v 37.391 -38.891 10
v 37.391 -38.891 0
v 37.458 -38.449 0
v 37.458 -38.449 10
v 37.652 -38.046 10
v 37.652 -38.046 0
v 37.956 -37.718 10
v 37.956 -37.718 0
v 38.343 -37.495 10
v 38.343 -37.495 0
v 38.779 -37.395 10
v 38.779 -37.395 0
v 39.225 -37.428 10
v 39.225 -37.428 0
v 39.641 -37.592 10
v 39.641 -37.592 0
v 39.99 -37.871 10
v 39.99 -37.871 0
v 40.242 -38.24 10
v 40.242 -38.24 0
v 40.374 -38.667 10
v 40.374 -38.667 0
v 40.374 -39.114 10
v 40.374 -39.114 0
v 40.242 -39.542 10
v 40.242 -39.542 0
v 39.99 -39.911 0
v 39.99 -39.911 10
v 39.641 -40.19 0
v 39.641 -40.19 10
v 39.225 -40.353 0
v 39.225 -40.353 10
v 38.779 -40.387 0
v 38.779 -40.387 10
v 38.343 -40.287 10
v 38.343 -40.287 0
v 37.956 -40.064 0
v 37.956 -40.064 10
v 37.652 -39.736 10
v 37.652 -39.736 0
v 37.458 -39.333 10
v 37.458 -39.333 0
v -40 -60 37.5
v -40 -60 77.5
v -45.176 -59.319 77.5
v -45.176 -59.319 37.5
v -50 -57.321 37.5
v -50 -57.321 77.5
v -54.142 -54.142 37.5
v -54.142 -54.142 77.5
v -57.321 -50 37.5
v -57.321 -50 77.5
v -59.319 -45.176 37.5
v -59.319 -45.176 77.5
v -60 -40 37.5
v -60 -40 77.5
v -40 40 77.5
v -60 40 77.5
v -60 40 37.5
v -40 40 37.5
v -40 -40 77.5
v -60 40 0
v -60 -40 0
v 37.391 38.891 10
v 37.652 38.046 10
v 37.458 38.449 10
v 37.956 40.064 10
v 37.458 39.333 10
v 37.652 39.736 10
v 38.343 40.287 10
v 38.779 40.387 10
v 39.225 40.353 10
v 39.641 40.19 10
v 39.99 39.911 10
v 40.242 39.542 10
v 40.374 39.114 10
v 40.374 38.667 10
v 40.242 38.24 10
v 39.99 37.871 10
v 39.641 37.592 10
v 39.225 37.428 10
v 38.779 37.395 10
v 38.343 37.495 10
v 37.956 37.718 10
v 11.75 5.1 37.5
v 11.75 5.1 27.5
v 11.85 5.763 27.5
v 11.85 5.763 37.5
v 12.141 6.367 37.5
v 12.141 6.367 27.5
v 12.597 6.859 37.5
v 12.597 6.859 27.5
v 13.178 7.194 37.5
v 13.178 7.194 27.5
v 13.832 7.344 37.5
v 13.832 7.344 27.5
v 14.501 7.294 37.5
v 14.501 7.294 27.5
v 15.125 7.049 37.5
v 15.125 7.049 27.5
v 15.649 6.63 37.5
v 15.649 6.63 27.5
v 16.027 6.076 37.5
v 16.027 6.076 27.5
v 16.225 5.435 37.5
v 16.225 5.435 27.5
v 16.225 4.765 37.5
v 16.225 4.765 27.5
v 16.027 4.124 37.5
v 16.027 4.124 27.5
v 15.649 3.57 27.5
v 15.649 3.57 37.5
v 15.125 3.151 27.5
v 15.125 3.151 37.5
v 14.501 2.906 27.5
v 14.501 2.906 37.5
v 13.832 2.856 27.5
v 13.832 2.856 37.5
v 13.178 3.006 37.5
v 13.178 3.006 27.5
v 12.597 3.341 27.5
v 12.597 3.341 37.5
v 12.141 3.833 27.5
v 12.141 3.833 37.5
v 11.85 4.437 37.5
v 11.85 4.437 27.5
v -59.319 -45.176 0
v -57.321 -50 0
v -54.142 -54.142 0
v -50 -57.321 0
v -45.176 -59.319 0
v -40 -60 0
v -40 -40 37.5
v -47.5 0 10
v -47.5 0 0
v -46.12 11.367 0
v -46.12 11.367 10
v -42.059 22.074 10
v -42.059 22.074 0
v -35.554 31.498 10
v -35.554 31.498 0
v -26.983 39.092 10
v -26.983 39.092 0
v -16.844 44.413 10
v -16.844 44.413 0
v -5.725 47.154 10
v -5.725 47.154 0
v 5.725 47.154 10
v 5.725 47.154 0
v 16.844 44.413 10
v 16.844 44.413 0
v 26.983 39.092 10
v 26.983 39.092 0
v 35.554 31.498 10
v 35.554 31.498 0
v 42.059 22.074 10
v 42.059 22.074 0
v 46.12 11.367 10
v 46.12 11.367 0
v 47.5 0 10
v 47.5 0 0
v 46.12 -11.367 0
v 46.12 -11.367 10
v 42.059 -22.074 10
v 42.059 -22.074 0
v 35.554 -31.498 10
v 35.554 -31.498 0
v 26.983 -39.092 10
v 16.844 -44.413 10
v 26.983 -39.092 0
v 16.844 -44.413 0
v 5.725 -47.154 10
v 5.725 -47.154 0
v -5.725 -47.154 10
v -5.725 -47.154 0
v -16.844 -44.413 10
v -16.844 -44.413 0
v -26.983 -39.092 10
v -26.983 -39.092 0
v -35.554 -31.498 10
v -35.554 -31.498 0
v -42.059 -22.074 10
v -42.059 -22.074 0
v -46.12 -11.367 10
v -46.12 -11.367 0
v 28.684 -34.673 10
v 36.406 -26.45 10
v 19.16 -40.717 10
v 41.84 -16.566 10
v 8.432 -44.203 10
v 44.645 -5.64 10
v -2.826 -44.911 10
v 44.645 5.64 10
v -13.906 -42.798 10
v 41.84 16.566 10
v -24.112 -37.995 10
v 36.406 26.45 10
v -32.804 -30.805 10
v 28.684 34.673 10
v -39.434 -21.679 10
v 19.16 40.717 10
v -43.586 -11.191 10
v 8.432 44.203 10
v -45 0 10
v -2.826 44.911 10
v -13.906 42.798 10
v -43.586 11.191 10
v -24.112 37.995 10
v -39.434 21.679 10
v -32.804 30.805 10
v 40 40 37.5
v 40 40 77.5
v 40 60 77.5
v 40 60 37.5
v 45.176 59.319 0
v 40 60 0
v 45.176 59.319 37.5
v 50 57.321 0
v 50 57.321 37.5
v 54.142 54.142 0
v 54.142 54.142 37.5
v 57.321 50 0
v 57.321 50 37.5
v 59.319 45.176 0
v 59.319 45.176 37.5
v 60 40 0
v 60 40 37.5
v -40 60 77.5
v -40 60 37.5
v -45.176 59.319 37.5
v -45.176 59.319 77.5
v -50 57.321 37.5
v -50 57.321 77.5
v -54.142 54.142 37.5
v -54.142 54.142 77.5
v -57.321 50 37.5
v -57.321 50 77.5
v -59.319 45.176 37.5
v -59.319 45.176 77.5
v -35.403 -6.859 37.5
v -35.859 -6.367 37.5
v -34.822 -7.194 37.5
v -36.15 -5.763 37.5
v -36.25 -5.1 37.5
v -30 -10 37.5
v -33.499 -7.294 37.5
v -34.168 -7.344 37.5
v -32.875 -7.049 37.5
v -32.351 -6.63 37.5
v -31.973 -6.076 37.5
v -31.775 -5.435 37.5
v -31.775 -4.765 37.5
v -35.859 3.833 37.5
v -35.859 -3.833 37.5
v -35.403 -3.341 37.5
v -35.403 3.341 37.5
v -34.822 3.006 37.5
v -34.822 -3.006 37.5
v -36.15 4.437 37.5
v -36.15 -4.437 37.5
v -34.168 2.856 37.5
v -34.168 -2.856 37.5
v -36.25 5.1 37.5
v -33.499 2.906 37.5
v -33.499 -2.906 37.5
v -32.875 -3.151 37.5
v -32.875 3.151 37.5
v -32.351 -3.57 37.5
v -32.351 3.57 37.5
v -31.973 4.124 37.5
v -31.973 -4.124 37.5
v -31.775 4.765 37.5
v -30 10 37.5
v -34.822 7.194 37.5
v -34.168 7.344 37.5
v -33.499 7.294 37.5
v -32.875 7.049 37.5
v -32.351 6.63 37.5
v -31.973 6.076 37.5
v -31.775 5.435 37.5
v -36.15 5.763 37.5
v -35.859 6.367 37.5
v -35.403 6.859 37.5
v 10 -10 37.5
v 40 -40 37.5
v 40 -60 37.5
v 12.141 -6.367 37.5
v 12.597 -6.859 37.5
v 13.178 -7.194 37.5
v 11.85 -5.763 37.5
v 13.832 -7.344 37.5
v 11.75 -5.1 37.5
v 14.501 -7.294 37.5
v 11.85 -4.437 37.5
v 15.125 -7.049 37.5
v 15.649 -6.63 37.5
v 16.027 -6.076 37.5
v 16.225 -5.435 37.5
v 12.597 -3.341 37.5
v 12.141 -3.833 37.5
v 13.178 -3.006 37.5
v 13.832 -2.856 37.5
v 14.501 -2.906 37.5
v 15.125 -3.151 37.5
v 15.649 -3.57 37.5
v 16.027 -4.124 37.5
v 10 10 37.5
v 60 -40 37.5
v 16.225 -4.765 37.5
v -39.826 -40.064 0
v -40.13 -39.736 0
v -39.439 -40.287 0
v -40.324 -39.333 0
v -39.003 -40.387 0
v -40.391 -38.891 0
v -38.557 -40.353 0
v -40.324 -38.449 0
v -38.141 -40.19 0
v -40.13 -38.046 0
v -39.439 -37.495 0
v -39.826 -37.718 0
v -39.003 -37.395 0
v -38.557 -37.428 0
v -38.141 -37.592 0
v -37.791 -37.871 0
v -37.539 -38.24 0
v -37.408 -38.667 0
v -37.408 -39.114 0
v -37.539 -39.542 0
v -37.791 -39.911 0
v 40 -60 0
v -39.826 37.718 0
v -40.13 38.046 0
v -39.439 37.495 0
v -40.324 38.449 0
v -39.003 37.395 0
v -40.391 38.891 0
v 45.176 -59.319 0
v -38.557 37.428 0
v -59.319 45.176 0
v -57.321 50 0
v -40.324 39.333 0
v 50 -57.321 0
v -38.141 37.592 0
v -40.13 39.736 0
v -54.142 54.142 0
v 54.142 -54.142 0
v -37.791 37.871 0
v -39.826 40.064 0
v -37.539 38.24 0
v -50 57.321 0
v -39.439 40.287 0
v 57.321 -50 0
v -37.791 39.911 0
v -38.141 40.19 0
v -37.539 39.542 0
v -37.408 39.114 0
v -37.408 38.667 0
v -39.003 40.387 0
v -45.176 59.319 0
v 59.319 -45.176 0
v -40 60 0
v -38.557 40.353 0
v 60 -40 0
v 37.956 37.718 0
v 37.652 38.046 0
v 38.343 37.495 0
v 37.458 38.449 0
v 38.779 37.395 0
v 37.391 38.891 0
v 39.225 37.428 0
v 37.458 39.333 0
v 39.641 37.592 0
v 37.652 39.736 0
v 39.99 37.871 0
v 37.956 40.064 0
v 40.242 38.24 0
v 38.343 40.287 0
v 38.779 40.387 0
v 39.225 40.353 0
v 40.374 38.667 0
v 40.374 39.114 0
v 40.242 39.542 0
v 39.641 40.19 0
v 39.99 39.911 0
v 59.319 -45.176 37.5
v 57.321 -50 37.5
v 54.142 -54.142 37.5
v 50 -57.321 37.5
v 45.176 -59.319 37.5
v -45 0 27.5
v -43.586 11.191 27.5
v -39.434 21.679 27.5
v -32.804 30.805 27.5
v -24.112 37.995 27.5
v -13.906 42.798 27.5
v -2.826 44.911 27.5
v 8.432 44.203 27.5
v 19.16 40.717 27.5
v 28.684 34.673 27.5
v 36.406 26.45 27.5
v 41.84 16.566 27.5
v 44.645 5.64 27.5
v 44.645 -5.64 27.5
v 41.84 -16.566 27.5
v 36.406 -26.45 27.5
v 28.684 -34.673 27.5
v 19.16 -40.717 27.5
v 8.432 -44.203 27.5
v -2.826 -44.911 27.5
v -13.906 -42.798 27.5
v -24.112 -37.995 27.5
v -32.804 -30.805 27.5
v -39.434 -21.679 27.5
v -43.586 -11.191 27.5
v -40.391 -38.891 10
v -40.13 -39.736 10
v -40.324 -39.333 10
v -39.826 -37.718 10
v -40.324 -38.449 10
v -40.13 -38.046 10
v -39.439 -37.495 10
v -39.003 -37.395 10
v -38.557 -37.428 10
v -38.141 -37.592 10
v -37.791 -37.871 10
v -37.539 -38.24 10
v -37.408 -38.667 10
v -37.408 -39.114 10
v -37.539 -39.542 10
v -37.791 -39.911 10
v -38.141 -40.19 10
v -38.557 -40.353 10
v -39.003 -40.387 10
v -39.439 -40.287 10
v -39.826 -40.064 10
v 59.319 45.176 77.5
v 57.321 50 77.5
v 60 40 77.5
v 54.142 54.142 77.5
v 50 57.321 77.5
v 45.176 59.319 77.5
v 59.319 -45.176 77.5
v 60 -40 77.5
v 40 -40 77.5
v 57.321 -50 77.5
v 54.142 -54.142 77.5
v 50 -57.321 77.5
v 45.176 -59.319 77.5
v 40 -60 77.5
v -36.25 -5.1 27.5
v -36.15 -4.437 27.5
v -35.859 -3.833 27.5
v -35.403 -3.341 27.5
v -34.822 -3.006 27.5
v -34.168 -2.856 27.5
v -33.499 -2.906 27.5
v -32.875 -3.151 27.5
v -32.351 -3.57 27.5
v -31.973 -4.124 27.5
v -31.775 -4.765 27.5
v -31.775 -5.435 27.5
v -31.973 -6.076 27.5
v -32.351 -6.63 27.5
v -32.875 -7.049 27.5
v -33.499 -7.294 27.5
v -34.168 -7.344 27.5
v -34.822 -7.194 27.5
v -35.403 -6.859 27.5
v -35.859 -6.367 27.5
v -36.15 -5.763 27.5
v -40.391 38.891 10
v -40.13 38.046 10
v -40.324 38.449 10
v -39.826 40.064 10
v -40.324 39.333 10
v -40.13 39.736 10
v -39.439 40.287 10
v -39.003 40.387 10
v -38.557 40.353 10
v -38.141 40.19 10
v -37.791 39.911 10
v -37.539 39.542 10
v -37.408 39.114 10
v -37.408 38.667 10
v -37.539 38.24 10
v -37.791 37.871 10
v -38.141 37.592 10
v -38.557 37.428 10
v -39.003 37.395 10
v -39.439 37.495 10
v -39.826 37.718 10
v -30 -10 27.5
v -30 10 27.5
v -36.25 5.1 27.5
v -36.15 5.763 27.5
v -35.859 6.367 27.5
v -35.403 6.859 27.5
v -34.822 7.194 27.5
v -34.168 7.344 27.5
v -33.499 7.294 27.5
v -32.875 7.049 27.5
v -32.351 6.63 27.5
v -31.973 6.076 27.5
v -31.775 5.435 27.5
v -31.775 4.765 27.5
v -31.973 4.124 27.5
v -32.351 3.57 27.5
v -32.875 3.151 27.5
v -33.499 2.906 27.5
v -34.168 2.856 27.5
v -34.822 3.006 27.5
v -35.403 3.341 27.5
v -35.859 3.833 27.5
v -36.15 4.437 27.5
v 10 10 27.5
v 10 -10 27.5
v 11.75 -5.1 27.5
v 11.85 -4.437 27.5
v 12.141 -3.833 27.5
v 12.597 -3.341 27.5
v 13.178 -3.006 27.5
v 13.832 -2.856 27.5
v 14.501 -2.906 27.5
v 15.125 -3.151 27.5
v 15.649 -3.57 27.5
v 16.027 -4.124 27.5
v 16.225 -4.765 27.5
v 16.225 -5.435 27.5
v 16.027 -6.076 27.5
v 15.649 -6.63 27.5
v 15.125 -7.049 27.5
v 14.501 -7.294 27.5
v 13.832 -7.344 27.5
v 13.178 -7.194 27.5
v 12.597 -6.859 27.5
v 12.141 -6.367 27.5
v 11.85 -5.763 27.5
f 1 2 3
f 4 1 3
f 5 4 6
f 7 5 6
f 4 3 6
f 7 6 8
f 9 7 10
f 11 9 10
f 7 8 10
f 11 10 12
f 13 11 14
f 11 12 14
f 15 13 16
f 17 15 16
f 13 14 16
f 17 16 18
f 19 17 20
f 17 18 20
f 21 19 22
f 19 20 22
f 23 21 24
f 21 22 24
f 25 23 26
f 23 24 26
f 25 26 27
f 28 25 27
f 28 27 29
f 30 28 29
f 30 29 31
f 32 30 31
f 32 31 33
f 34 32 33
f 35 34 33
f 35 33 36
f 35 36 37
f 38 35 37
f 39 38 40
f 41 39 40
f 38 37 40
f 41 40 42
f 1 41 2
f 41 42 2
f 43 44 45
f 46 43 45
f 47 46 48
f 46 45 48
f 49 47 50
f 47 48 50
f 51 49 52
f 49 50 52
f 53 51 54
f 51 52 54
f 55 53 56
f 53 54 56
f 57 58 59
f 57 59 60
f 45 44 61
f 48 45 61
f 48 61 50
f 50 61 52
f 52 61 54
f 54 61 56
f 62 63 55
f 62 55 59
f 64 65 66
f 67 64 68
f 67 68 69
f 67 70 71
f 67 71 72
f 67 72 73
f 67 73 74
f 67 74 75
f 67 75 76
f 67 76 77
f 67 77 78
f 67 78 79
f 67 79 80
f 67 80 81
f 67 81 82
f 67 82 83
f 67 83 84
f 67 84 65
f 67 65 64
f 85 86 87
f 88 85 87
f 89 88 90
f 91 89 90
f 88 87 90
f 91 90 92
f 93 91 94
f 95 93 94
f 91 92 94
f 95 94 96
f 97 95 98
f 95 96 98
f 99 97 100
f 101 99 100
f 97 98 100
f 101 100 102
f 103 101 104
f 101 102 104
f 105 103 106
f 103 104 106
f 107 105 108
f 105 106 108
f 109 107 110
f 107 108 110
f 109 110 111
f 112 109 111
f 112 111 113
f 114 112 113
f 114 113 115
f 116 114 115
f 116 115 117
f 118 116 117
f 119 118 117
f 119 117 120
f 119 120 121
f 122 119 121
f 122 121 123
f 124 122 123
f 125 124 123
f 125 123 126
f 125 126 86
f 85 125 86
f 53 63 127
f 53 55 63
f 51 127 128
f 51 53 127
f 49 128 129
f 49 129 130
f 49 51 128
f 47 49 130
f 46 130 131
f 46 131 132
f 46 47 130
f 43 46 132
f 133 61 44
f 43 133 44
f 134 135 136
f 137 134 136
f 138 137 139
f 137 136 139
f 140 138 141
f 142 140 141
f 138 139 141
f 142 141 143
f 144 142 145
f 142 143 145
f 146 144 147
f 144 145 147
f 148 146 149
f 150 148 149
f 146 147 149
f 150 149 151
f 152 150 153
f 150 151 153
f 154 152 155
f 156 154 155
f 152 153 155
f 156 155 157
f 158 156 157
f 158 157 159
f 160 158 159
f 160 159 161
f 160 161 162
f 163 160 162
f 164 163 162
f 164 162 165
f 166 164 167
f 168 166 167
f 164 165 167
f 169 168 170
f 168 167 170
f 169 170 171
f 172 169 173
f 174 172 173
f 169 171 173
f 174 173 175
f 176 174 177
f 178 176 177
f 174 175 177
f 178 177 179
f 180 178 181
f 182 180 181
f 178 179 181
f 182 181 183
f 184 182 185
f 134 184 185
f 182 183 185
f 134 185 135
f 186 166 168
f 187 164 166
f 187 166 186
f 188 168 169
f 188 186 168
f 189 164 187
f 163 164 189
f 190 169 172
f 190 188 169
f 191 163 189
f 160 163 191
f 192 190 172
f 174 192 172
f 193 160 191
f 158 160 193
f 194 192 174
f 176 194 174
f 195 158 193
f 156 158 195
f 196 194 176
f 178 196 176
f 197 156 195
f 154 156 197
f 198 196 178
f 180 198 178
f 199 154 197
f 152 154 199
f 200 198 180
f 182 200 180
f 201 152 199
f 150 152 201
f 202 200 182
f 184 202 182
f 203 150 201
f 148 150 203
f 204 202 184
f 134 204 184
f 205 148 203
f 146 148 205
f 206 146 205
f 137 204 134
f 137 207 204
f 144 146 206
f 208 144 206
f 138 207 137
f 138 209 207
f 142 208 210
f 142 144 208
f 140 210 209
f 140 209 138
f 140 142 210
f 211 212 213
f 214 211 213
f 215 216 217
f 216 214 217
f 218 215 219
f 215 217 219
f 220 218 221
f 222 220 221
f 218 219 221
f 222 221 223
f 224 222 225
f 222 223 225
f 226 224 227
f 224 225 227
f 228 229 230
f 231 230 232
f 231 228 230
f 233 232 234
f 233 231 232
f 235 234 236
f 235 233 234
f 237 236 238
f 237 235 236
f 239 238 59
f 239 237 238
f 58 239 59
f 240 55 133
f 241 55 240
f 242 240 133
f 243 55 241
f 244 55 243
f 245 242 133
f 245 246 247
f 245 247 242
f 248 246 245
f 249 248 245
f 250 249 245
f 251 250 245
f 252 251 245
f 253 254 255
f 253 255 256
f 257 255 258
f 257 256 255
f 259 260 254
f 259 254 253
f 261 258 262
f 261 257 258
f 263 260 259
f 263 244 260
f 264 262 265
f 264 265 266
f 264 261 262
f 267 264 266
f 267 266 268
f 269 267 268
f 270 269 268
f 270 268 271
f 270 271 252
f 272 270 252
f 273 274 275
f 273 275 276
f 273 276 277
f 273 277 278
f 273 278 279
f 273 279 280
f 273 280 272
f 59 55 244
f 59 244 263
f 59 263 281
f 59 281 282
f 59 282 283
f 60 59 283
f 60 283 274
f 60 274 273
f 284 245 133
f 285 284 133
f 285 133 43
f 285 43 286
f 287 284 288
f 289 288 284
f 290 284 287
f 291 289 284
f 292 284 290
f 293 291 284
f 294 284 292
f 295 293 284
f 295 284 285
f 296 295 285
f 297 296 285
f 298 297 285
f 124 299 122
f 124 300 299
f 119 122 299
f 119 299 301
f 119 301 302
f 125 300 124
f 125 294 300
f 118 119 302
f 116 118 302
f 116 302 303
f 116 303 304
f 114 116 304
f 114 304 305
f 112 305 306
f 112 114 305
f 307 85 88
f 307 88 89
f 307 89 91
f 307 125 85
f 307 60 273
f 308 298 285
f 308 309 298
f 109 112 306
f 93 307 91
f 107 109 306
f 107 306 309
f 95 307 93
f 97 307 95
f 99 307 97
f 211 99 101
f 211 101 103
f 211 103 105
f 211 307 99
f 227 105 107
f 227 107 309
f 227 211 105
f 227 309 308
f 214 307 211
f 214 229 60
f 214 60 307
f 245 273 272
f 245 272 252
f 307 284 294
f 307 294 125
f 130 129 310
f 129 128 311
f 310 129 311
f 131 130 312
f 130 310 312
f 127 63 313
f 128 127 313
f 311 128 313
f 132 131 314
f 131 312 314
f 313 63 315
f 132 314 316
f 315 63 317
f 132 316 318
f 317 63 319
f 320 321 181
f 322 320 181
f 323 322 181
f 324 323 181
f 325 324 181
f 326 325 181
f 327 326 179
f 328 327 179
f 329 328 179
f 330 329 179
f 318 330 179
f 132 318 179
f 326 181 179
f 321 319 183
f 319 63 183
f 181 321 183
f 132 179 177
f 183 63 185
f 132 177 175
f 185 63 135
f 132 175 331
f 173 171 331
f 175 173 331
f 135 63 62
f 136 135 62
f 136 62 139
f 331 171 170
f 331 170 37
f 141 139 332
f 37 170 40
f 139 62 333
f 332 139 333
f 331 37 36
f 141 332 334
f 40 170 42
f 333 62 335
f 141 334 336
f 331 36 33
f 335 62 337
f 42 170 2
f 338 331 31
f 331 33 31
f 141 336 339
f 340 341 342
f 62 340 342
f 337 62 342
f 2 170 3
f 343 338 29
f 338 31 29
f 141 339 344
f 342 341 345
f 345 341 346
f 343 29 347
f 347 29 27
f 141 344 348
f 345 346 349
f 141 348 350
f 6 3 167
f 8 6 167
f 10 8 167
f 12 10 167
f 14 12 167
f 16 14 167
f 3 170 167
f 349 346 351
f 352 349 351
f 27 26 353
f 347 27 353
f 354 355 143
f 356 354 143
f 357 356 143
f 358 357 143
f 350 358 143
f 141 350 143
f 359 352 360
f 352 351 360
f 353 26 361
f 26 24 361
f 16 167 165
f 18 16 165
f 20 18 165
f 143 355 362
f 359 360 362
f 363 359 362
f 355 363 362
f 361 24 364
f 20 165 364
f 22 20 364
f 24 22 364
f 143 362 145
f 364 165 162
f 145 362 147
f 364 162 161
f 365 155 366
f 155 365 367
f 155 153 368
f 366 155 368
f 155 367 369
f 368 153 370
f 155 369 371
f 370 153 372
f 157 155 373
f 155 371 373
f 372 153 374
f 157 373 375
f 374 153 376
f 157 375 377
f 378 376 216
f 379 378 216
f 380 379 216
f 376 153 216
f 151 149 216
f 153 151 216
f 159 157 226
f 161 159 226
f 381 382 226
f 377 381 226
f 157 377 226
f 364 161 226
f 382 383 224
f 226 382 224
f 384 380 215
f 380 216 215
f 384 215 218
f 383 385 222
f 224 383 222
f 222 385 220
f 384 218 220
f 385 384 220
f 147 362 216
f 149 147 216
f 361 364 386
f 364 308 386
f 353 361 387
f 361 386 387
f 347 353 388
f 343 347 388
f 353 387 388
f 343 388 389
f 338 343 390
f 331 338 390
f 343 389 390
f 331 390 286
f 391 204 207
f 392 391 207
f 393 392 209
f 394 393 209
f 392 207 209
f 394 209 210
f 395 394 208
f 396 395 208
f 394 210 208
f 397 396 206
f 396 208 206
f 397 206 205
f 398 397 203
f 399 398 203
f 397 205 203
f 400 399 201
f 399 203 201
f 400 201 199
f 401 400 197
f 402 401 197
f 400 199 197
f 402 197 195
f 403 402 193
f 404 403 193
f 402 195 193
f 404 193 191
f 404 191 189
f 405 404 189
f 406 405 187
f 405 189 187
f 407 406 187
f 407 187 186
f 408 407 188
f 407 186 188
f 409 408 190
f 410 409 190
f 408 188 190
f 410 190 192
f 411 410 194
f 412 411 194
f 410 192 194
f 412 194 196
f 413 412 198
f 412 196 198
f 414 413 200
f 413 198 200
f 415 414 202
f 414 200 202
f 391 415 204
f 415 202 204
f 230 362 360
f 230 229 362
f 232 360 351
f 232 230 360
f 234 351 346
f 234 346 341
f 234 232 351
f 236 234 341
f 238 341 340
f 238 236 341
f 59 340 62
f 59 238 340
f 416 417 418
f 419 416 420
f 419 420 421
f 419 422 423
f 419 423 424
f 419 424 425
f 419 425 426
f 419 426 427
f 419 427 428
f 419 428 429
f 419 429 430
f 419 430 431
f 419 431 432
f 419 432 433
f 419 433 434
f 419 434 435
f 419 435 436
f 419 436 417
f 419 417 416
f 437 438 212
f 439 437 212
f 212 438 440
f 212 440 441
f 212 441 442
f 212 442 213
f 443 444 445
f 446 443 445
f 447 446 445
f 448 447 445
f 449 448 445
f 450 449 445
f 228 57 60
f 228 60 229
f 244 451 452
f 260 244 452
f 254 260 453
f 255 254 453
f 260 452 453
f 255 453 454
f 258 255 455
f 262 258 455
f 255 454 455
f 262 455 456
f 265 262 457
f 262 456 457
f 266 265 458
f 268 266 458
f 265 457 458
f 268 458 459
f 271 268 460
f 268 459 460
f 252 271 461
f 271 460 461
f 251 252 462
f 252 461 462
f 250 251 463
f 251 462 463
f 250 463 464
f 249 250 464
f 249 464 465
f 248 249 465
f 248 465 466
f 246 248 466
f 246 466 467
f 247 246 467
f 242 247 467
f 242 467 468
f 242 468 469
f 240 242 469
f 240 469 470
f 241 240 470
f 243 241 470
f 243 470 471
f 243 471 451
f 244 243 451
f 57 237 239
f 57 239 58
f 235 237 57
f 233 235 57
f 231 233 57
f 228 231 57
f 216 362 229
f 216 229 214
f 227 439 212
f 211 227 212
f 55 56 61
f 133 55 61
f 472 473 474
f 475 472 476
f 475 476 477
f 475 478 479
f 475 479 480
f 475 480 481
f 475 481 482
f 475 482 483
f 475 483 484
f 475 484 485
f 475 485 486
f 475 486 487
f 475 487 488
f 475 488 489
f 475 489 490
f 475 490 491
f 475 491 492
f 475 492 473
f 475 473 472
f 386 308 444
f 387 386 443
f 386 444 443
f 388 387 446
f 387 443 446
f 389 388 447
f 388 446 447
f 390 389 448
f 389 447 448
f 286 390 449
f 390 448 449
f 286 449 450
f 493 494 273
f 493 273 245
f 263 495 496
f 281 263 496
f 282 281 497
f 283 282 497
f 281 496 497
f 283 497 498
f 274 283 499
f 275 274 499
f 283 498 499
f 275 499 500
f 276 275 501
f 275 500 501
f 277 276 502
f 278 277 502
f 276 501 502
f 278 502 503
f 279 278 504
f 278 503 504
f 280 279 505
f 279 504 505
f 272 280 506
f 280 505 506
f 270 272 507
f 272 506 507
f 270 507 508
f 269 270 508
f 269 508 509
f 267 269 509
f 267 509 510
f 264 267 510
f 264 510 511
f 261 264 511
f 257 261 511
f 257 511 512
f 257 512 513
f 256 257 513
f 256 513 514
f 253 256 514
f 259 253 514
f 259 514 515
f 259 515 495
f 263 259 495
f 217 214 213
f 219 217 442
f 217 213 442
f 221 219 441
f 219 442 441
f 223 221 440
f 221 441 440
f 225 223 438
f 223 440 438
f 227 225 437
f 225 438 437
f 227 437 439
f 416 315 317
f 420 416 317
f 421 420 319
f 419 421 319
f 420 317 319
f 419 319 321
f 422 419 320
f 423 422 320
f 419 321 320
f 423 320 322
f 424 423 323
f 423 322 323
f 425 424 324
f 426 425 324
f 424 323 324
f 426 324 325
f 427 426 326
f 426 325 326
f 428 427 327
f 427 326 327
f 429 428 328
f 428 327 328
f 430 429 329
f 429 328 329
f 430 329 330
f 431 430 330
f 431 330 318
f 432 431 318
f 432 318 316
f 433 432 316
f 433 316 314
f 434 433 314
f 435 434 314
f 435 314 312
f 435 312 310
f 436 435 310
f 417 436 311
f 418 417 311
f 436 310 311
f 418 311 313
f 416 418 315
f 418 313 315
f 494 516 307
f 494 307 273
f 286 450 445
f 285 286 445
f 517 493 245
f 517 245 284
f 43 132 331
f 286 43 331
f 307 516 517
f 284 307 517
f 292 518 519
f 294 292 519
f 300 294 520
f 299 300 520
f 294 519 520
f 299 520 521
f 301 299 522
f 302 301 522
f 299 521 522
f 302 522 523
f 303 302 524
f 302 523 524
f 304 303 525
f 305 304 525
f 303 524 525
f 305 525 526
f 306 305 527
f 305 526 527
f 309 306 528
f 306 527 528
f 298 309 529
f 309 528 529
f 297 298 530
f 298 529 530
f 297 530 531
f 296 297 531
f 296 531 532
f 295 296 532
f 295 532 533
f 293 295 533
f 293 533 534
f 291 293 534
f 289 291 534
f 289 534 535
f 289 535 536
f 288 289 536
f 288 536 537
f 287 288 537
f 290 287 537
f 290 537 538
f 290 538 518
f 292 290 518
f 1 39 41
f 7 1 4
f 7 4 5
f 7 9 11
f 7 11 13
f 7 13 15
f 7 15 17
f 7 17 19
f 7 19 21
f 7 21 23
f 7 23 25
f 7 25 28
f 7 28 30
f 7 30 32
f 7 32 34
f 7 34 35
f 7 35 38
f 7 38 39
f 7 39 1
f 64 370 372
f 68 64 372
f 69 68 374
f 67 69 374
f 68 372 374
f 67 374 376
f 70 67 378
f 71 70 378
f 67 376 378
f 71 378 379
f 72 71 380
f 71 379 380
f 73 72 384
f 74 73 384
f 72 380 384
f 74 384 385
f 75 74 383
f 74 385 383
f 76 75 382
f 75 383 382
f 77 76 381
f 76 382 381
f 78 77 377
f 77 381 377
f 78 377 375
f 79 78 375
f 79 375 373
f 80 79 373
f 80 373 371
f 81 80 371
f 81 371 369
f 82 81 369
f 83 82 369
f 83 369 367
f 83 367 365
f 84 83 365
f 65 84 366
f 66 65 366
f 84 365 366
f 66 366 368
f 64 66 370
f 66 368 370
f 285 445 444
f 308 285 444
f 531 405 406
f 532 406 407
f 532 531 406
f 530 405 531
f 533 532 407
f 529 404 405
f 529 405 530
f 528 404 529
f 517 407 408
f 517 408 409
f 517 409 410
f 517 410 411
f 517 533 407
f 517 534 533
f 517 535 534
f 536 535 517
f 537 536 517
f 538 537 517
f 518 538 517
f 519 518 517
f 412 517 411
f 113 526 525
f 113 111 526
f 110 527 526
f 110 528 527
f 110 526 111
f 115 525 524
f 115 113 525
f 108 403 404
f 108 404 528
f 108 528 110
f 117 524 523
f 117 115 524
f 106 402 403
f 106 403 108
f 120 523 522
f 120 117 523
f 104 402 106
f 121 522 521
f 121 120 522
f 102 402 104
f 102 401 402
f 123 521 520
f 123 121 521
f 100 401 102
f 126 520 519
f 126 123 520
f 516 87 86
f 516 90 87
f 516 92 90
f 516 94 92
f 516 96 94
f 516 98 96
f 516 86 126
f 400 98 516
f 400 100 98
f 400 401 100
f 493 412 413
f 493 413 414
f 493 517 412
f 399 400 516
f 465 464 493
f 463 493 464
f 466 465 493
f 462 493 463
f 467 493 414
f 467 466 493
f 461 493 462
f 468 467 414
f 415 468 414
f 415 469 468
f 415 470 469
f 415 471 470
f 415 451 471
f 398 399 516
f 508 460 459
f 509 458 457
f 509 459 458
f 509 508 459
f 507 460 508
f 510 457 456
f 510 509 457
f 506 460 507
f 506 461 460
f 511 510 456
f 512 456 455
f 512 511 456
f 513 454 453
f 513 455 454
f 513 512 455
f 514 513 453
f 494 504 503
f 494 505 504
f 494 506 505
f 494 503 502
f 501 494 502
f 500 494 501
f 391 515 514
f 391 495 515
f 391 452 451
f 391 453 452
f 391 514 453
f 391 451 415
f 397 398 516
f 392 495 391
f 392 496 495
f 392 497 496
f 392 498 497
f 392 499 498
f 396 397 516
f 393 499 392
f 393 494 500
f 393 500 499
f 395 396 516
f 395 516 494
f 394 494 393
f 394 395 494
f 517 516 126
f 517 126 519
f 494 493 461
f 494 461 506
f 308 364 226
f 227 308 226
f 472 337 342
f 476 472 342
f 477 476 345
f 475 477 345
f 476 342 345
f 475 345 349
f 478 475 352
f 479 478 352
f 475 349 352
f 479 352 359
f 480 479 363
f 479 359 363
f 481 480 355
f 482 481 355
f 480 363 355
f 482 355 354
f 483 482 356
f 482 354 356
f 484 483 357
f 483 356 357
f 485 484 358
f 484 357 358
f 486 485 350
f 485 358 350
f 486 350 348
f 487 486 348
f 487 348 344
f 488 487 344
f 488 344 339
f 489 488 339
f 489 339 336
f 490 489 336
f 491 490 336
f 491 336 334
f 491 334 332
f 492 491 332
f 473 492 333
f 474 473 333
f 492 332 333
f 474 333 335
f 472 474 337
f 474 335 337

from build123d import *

# Parameters (mm, degrees)
SKETCH_1_W          = 120
SKETCH_1_H          = 120
EXTRUDE_1_DEPTH     = 100
SKETCH_2_R          = 47.5
CUT_EXTRUDE_1_DEPTH = 10
SKETCH_3_R          = 45
CUT_EXTRUDE_2_DEPTH = 17.5
SKETCH_4_W          = 120
SKETCH_4_H          = 120
CUT_EXTRUDE_3_DEPTH = 49.5
SKETCH_6_W          = 120
SKETCH_6_H          = 120
CUT_EXTRUDE_5_DEPTH = 13
CUT_EXTRUDE_6_DEPTH = 13
SKETCH_8_R          = 2.25
CUT_EXTRUDE_7_DEPTH = 13
SKETCH_10_R         = 2.25
CUT_EXTRUDE_8_DEPTH = 13
FILLET_1_R          = 20
FILLET_2_R          = 20
SKETCH_11_R         = 1.5
CUT_EXTRUDE_9_DEPTH = 10
EXTRUDE_START       = 40
EXTRUDE_3_DEPTH     = 40


with BuildPart() as part:
    # 草图1 → 凸台-拉伸1 (new body)
    with BuildSketch(Plane.XY):
        Rectangle(SKETCH_1_W, SKETCH_1_H)
    extrude(amount=EXTRUDE_1_DEPTH)

    # 草图2 → 切除-拉伸1 (cut)
    with BuildSketch(Plane(origin=(0, 0, 0), x_dir=(-1, 0, 0), z_dir=(0, 0, -1))):
        Circle(SKETCH_2_R)
    extrude(amount=-CUT_EXTRUDE_1_DEPTH, mode=Mode.SUBTRACT)

    # 草图3 → 切除-拉伸2 (cut)
    with BuildSketch(Plane(origin=(0, 0, 10), x_dir=(-1, 0, 0), z_dir=(0, 0, -1))):
        Circle(SKETCH_3_R)
    extrude(amount=-CUT_EXTRUDE_2_DEPTH, mode=Mode.SUBTRACT)

    # 草图4 → 切除-拉伸3 (cut)
    with BuildSketch(Plane.XY.offset(100)):
        Rectangle(SKETCH_4_W, SKETCH_4_H)
    extrude(amount=-CUT_EXTRUDE_3_DEPTH, mode=Mode.SUBTRACT)

    # 草图6 → 切除-拉伸5 (cut)
    with BuildSketch(Plane.XY.offset(50.5)):
        Rectangle(SKETCH_6_W, SKETCH_6_H)
    extrude(amount=-CUT_EXTRUDE_5_DEPTH, mode=Mode.SUBTRACT)

    # 草图7 → 切除-拉伸6 (cut)
    with BuildSketch(Plane(origin=(0, 0, 27.5), x_dir=(-1, 0, 0), z_dir=(0, 0, -1))):
        Polygon((-10, 10), (30, 10), (30, -10), (-10, -10), (-10, 0), align=None)
    extrude(amount=-CUT_EXTRUDE_6_DEPTH, mode=Mode.SUBTRACT)

    # 草图8 → 切除-拉伸7 (cut)
    with BuildSketch(Plane(origin=(0, 0, 27.5), x_dir=(-1, 0, 0), z_dir=(0, 0, -1))):
        with Locations((-14, 5.1)):
            Circle(SKETCH_8_R)
        with Locations((-14, -5.1)):
            Circle(SKETCH_8_R)
    extrude(amount=-CUT_EXTRUDE_7_DEPTH, mode=Mode.SUBTRACT)

    # 草图10 → 切除-拉伸8 (cut)
    with BuildSketch(Plane(origin=(0, 0, 27.5), x_dir=(-1, 0, 0), z_dir=(0, 0, -1))):
        with Locations((34, 5.1)):
            Circle(SKETCH_10_R)
        with Locations((34, -5.1)):
            Circle(SKETCH_10_R)
    extrude(amount=-CUT_EXTRUDE_8_DEPTH, mode=Mode.SUBTRACT)

    # 圆角1
    fillet_1_edges = [part.edges().sort_by_distance(p)[0] for p in [
        (60, 60, 18.75),
    ]]
    fillet(fillet_1_edges, radius=FILLET_1_R)

    # 圆角2
    fillet_2_edges = [part.edges().sort_by_distance(p)[0] for p in [
        (60, -60, 18.75),
        (-60, -60, 18.75),
        (-60, 60, 18.75),
    ]]
    fillet(fillet_2_edges, radius=FILLET_2_R)

    # 草图11 → 切除-拉伸9 (cut)
    with BuildSketch(Plane(origin=(0, 0, 0), x_dir=(-1, 0, 0), z_dir=(0, 0, -1))):
        with Locations((-38.890872965, 38.890872965)):
            Circle(SKETCH_11_R)
        with Locations((38.890872965, 38.890872965)):
            Circle(SKETCH_11_R)
        with Locations((38.890872965, -38.890872965)):
            Circle(SKETCH_11_R)
        with Locations((-38.890872965, -38.890872965)):
            Circle(SKETCH_11_R)
    extrude(amount=-CUT_EXTRUDE_9_DEPTH, mode=Mode.SUBTRACT)

    # 草图12 → 凸台-拉伸3 (add)
    with BuildSketch(Plane.XY.offset(37.5).offset(EXTRUDE_START)):
        with BuildLine():
            Line((-40, 40), (-40, 60))
            ThreePointArc((-40, 60), (-54.142135624, 54.142135624), (-60, 40))
            Line((-60, 40), (-40, 40))
        make_face()
        with BuildLine():
            Line((40, 40), (40, 60))
            ThreePointArc((40, 60), (54.142135624, 54.142135624), (60, 40))
            Line((60, 40), (40, 40))
        make_face()
        with BuildLine():
            Line((40, -40), (60, -40))
            ThreePointArc((60, -40), (54.142135624, -54.142135624), (40, -60))
            Line((40, -60), (40, -40))
        make_face()
        with BuildLine():
            Line((-40, -40), (-40, -60))
            ThreePointArc((-40, -60), (-54.142135624, -54.142135624), (-60, -40))
            Line((-60, -40), (-40, -40))
        make_face()
    extrude(amount=-EXTRUDE_3_DEPTH)


solid = part.part
